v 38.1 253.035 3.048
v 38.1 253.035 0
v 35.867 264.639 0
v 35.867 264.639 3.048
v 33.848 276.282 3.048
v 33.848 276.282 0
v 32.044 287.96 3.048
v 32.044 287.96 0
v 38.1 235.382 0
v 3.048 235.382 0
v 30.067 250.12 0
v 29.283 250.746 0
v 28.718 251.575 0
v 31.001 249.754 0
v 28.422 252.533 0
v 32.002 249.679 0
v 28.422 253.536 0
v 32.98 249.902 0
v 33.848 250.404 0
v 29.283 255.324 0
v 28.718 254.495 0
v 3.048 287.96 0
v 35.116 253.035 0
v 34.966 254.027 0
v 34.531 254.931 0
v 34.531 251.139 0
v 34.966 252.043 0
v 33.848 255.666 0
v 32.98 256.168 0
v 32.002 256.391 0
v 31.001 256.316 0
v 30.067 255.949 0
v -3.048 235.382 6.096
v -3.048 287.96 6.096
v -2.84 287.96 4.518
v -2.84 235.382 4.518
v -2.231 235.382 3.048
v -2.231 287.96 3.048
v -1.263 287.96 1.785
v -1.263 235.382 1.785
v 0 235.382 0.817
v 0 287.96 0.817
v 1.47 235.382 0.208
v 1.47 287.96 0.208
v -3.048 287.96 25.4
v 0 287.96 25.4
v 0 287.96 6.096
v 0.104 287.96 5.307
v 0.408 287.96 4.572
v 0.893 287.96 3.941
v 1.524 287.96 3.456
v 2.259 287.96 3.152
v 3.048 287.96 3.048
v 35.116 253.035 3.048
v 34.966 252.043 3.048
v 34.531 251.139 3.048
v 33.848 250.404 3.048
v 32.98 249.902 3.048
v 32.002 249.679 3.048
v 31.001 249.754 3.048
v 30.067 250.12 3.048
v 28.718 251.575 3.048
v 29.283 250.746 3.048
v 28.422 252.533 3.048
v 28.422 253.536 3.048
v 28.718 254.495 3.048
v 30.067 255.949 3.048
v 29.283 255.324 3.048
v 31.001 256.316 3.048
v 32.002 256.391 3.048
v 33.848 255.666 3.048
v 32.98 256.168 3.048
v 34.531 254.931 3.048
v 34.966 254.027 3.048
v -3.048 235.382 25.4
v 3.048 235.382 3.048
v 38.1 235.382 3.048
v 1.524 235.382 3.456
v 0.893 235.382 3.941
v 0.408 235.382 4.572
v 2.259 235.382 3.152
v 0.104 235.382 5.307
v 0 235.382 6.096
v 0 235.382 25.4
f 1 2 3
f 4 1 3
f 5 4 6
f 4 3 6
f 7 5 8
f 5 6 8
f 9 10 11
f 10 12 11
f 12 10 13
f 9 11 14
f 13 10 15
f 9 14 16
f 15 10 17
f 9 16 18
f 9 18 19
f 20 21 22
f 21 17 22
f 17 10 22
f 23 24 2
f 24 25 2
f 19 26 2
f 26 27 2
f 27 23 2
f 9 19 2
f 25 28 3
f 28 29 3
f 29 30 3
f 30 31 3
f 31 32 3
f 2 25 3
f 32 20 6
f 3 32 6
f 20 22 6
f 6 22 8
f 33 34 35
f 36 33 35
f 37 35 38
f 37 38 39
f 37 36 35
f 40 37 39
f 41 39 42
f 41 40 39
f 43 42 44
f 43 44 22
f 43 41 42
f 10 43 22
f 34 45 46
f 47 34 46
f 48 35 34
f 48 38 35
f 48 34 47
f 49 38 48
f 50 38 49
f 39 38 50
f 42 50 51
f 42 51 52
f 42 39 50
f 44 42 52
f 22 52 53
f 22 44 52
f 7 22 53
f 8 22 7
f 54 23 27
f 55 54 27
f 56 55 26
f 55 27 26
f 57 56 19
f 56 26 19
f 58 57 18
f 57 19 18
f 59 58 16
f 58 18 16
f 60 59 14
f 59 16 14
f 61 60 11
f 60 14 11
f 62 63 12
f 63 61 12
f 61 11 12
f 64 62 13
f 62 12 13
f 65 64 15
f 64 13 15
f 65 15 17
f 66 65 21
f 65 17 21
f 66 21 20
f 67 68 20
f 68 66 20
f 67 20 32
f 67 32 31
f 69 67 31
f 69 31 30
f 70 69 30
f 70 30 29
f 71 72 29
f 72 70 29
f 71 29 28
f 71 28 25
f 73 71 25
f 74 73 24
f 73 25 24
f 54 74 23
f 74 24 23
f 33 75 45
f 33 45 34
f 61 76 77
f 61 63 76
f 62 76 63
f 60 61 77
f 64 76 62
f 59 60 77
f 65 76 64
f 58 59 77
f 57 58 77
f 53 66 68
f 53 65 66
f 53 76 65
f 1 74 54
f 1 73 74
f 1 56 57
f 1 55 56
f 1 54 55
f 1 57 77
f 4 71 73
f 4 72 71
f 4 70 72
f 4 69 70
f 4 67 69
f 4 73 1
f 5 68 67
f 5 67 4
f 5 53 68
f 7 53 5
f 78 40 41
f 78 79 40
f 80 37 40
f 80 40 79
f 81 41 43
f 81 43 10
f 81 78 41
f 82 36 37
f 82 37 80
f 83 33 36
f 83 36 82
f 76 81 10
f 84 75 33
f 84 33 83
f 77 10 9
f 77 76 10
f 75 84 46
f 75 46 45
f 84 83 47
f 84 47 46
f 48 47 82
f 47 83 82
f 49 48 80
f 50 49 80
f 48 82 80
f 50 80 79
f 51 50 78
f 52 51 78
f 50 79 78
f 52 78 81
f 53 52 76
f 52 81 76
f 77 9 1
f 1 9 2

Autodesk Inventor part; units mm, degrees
ref_plane "YZ Plane" through (0, 0, 0) normal (1, 0, 0) x (0, 1, 0)
ref_plane "XZ Plane" through (0, 0, 0) normal (0, 1, 0) x (-1, 0, 0)
ref_plane "XY Plane" through (0, 0, 0) normal (0, 0, 1) x (1, 0, 0)
sketch "Sketch1" plane through (0, 0, 0) normal (0, 0, 1) x (1, 0, 0)
  line L0 (0, 0) -> (38.1, 0)
  line L1 (38.1, 0) -> (38.1, 253.0348)
  arc A0 (38.1, 507.0348) -> (38.1, 253.0348) centre (666.75, 380.0348) ccw
  line L2 (38.1, 507.0348) -> (38.1, 608.6348)
  line L3 (38.1, 608.6348) -> (0, 608.6348)
  line L4 (0, 608.6348) -> (0, 0)
  circle A1 centre (31.75, 151.4348) radius 3.3655
  circle A2 centre (31.75, 34.671) radius 3.3655
  circle A3 centre (12.7, 12.7) radius 3.3655
  circle A4 centre (12.7, 342.9) radius 3.3655
  circle A5 centre (12.7, 595.9348) radius 3.3655
  circle A6 centre (31.75, 12.7) radius 3.3655
  circle A7 centre (31.75, 253.0348) radius 3.3655
  circle A8 centre (31.75, 507.0348) radius 3.3655
  circle A9 centre (31.75, 595.9348) radius 3.3655
  line L5 (0, 557.8348) -> (0, 608.6348)
  line L6 (0, 50.8) -> (0, 0)
  line L7 (12.7, 342.9) -> (0, 304.3174) construction
  line L8 (0, 317.5) -> (0, 368.3)
  line L9 (0, 129.921) -> (12.7, 129.921) construction
  circle A10 centre (12.7, 129.921) radius 3.3655
  circle A11 centre (12.7, 174.371) radius 3.3655
  line L10 (9.3413, 197.482) -> (9.3413, 204.213)
  line L11 (16.0611, 204.488) -> (16.0611, 197.3435)
  arc A12 (16.0611, 204.488) -> (9.3413, 204.213) centre (12.6956, 204.488) ccw
  arc A13 (9.3413, 197.482) -> (16.0611, 197.3435) centre (12.6974, 197.231) ccw
  circle A14 centre (12.7, 217.188) radius 3.3655
  line L12 (35.1155, 268.8247) -> (0, 268.8247)
  dimension "d0" = 38.1
  dimension "d2" = 101.6
  dimension "d4" = 457.2
  dimension "d5" = 101.6
  dimension "d6" = 666.75
  dimension "d7" = 641.35
  dimension "d9" = 116.7638
  dimension "d10" = 6.35
  dimension "d11" = 6.35
  dimension "d13" = 12.7
  dimension "d14" = 12.7
  dimension "d16" = 12.7
  dimension "d17" = 342.9
  dimension "d19" = 12.7
  dimension "d20" = 12.7
  dimension "d22" = 6.35
  dimension "d24" = 6.35
  dimension "d25" = 6.731
  dimension "d26" = 6.35
  dimension "hole" = 6.731
  dimension "d28" = 6.35
  dimension "d45" = 12.7
  dimension "d47" = 12.7
  dimension "d54" = 6.731
  dimension "d55" = 3.3655
  dimension "d56" = 3.3655
  dimension "d58" = 6.731
  dimension "d59" = 12.7
  dimension "d68" = 18.22
  dimension "d69" = 90
  dimension "d70" = 90
  dimension "d71" = 22.0389
  dimension "d72" = 28.7587
  dimension "d73" = 478.7138
  dimension "d74" = 6.35
  dimension "d75" = 6.35
  dimension "d76" = 595.9348
  dimension "d77" = 404.1468
  dimension "d78" = 411.2913
  dimension "d79" = 25.4
  dimension "d80" = 25.4
  dimension "d81" = 434.2638
  dimension "d82" = 50.8
  dimension "d83" = 240.3348
  dimension "d84" = 291.1348
  dimension "d85" = 557.8348
extrude "Plate4" add sketch "Sketch1" along normal blind 3.048
sketch "Sketch5" plane through (0, 0, 3.048) normal (0, 0, 1) x (1, 0, 0)
  line L0 (38.1, 0) -> (38.1, 253.0348) projected
  line L1 (0, 0) -> (38.1, 0)
  line L2 (38.1, 0) -> (38.1, 25.4)
  line L3 (38.1, 25.4) -> (0, 25.4)
  line L4 (0, 25.4) -> (0, 0)
  dimension "d96" = 25.4
extrude "Cut1" cut sketch "Sketch5" against normal blind 3.048
sketch "Sketch7" plane through (0, 25.4, 3.048) normal (-1, 0, 0) x (0, -1, 0)
  line L0 (-583.2348, 0) -> (0, 0)
  line L1 (0, 0) -> (0, 22.352)
  line L2 (0, 22.352) -> (-583.2348, 22.352)
  line L3 (-583.2348, 22.352) -> (-583.2348, 0)
edge flange "Flange3" height 25.4 angle 90 thickness 3.048 bend radius 3.048 thickness toward (-1, 0, 0) relief tear relief width 3.048 relief depth 1.524 edges at (0, 317.0174, 3.048) wall of the first edge with corners at (0, 608.6348, 3.048) (0, 25.4, 3.048) (0, 25.4, 25.4) (0, 608.6348, 25.4)
bend "Bend3"
corner "Corner3"
sketch "Sketch8" plane through (-3.048, 25.4, 25.4) normal (0, -1, 0) x (1, 0, 0)
  line L0 (0, 0) -> (41.148, 0)
  line L1 (41.148, 0) -> (41.148, -25.4)
  line L2 (41.148, -25.4) -> (0, -25.4)
  line L3 (0, -25.4) -> (0, 0)
  point P0 (3.048, -25.4)
sketch "Sketch9" plane through (-3.048, 608.6348, 25.4) normal (0, 1, 0) x (1, 0, 0)
  line L0 (41.148, 25.4) -> (0, 25.4)
  line L1 (0, 25.4) -> (0, 0)
  line L2 (0, 0) -> (41.148, 0)
  line L3 (41.148, 0) -> (41.148, 25.4)
  point P0 (3.048, 25.4)
extrude "Extrusion1" cut sketch "Sketch9" against normal blind 320.675
extrude "Extrusion2" cut sketch "Sketch8" against normal blind 209.9818
equation "\"d97\" = Thickness"
equation "\"d25\" = hole"
equation "\"d109\" = BendReliefWidth"
equation "\"d110\" = BendReliefDepth"
equation "\"d111\" = MinimumRemnant"
equation "\"d112\" = BendRadius"
equation "\"d115\" = BendRadius"
equation "\"d116\" = CornerReliefSize"
equation "\"d117\" = GapSize"
equation "\"d118\" = JacobiRadiusSize"
equation "\"BendRadius\" = Thickness"
equation "\"BendReliefWidth\" = Thickness"
equation "\"BendReliefDepth\" = 0.5 * Thickness"
equation "\"CornerReliefSize\" = 4 * Thickness"
equation "\"MinimumRemnant\" = 2 * Thickness"
equation "\"TransitionRadius\" = BendRadius"
equation "\"JacobiRadiusSize\" = BendRadius"
equation "\"GapSize\" = Thickness"
equation "\"d29\" = BendRadius"
equation "\"d32\" = BendRadius"
equation "\"d38\" = BendRadius"
equation "\"d60\" = BendRadius"
equation "\"Thickness\" = 3.048"
properties part number "Claw - Arm - Top (R) v2"
